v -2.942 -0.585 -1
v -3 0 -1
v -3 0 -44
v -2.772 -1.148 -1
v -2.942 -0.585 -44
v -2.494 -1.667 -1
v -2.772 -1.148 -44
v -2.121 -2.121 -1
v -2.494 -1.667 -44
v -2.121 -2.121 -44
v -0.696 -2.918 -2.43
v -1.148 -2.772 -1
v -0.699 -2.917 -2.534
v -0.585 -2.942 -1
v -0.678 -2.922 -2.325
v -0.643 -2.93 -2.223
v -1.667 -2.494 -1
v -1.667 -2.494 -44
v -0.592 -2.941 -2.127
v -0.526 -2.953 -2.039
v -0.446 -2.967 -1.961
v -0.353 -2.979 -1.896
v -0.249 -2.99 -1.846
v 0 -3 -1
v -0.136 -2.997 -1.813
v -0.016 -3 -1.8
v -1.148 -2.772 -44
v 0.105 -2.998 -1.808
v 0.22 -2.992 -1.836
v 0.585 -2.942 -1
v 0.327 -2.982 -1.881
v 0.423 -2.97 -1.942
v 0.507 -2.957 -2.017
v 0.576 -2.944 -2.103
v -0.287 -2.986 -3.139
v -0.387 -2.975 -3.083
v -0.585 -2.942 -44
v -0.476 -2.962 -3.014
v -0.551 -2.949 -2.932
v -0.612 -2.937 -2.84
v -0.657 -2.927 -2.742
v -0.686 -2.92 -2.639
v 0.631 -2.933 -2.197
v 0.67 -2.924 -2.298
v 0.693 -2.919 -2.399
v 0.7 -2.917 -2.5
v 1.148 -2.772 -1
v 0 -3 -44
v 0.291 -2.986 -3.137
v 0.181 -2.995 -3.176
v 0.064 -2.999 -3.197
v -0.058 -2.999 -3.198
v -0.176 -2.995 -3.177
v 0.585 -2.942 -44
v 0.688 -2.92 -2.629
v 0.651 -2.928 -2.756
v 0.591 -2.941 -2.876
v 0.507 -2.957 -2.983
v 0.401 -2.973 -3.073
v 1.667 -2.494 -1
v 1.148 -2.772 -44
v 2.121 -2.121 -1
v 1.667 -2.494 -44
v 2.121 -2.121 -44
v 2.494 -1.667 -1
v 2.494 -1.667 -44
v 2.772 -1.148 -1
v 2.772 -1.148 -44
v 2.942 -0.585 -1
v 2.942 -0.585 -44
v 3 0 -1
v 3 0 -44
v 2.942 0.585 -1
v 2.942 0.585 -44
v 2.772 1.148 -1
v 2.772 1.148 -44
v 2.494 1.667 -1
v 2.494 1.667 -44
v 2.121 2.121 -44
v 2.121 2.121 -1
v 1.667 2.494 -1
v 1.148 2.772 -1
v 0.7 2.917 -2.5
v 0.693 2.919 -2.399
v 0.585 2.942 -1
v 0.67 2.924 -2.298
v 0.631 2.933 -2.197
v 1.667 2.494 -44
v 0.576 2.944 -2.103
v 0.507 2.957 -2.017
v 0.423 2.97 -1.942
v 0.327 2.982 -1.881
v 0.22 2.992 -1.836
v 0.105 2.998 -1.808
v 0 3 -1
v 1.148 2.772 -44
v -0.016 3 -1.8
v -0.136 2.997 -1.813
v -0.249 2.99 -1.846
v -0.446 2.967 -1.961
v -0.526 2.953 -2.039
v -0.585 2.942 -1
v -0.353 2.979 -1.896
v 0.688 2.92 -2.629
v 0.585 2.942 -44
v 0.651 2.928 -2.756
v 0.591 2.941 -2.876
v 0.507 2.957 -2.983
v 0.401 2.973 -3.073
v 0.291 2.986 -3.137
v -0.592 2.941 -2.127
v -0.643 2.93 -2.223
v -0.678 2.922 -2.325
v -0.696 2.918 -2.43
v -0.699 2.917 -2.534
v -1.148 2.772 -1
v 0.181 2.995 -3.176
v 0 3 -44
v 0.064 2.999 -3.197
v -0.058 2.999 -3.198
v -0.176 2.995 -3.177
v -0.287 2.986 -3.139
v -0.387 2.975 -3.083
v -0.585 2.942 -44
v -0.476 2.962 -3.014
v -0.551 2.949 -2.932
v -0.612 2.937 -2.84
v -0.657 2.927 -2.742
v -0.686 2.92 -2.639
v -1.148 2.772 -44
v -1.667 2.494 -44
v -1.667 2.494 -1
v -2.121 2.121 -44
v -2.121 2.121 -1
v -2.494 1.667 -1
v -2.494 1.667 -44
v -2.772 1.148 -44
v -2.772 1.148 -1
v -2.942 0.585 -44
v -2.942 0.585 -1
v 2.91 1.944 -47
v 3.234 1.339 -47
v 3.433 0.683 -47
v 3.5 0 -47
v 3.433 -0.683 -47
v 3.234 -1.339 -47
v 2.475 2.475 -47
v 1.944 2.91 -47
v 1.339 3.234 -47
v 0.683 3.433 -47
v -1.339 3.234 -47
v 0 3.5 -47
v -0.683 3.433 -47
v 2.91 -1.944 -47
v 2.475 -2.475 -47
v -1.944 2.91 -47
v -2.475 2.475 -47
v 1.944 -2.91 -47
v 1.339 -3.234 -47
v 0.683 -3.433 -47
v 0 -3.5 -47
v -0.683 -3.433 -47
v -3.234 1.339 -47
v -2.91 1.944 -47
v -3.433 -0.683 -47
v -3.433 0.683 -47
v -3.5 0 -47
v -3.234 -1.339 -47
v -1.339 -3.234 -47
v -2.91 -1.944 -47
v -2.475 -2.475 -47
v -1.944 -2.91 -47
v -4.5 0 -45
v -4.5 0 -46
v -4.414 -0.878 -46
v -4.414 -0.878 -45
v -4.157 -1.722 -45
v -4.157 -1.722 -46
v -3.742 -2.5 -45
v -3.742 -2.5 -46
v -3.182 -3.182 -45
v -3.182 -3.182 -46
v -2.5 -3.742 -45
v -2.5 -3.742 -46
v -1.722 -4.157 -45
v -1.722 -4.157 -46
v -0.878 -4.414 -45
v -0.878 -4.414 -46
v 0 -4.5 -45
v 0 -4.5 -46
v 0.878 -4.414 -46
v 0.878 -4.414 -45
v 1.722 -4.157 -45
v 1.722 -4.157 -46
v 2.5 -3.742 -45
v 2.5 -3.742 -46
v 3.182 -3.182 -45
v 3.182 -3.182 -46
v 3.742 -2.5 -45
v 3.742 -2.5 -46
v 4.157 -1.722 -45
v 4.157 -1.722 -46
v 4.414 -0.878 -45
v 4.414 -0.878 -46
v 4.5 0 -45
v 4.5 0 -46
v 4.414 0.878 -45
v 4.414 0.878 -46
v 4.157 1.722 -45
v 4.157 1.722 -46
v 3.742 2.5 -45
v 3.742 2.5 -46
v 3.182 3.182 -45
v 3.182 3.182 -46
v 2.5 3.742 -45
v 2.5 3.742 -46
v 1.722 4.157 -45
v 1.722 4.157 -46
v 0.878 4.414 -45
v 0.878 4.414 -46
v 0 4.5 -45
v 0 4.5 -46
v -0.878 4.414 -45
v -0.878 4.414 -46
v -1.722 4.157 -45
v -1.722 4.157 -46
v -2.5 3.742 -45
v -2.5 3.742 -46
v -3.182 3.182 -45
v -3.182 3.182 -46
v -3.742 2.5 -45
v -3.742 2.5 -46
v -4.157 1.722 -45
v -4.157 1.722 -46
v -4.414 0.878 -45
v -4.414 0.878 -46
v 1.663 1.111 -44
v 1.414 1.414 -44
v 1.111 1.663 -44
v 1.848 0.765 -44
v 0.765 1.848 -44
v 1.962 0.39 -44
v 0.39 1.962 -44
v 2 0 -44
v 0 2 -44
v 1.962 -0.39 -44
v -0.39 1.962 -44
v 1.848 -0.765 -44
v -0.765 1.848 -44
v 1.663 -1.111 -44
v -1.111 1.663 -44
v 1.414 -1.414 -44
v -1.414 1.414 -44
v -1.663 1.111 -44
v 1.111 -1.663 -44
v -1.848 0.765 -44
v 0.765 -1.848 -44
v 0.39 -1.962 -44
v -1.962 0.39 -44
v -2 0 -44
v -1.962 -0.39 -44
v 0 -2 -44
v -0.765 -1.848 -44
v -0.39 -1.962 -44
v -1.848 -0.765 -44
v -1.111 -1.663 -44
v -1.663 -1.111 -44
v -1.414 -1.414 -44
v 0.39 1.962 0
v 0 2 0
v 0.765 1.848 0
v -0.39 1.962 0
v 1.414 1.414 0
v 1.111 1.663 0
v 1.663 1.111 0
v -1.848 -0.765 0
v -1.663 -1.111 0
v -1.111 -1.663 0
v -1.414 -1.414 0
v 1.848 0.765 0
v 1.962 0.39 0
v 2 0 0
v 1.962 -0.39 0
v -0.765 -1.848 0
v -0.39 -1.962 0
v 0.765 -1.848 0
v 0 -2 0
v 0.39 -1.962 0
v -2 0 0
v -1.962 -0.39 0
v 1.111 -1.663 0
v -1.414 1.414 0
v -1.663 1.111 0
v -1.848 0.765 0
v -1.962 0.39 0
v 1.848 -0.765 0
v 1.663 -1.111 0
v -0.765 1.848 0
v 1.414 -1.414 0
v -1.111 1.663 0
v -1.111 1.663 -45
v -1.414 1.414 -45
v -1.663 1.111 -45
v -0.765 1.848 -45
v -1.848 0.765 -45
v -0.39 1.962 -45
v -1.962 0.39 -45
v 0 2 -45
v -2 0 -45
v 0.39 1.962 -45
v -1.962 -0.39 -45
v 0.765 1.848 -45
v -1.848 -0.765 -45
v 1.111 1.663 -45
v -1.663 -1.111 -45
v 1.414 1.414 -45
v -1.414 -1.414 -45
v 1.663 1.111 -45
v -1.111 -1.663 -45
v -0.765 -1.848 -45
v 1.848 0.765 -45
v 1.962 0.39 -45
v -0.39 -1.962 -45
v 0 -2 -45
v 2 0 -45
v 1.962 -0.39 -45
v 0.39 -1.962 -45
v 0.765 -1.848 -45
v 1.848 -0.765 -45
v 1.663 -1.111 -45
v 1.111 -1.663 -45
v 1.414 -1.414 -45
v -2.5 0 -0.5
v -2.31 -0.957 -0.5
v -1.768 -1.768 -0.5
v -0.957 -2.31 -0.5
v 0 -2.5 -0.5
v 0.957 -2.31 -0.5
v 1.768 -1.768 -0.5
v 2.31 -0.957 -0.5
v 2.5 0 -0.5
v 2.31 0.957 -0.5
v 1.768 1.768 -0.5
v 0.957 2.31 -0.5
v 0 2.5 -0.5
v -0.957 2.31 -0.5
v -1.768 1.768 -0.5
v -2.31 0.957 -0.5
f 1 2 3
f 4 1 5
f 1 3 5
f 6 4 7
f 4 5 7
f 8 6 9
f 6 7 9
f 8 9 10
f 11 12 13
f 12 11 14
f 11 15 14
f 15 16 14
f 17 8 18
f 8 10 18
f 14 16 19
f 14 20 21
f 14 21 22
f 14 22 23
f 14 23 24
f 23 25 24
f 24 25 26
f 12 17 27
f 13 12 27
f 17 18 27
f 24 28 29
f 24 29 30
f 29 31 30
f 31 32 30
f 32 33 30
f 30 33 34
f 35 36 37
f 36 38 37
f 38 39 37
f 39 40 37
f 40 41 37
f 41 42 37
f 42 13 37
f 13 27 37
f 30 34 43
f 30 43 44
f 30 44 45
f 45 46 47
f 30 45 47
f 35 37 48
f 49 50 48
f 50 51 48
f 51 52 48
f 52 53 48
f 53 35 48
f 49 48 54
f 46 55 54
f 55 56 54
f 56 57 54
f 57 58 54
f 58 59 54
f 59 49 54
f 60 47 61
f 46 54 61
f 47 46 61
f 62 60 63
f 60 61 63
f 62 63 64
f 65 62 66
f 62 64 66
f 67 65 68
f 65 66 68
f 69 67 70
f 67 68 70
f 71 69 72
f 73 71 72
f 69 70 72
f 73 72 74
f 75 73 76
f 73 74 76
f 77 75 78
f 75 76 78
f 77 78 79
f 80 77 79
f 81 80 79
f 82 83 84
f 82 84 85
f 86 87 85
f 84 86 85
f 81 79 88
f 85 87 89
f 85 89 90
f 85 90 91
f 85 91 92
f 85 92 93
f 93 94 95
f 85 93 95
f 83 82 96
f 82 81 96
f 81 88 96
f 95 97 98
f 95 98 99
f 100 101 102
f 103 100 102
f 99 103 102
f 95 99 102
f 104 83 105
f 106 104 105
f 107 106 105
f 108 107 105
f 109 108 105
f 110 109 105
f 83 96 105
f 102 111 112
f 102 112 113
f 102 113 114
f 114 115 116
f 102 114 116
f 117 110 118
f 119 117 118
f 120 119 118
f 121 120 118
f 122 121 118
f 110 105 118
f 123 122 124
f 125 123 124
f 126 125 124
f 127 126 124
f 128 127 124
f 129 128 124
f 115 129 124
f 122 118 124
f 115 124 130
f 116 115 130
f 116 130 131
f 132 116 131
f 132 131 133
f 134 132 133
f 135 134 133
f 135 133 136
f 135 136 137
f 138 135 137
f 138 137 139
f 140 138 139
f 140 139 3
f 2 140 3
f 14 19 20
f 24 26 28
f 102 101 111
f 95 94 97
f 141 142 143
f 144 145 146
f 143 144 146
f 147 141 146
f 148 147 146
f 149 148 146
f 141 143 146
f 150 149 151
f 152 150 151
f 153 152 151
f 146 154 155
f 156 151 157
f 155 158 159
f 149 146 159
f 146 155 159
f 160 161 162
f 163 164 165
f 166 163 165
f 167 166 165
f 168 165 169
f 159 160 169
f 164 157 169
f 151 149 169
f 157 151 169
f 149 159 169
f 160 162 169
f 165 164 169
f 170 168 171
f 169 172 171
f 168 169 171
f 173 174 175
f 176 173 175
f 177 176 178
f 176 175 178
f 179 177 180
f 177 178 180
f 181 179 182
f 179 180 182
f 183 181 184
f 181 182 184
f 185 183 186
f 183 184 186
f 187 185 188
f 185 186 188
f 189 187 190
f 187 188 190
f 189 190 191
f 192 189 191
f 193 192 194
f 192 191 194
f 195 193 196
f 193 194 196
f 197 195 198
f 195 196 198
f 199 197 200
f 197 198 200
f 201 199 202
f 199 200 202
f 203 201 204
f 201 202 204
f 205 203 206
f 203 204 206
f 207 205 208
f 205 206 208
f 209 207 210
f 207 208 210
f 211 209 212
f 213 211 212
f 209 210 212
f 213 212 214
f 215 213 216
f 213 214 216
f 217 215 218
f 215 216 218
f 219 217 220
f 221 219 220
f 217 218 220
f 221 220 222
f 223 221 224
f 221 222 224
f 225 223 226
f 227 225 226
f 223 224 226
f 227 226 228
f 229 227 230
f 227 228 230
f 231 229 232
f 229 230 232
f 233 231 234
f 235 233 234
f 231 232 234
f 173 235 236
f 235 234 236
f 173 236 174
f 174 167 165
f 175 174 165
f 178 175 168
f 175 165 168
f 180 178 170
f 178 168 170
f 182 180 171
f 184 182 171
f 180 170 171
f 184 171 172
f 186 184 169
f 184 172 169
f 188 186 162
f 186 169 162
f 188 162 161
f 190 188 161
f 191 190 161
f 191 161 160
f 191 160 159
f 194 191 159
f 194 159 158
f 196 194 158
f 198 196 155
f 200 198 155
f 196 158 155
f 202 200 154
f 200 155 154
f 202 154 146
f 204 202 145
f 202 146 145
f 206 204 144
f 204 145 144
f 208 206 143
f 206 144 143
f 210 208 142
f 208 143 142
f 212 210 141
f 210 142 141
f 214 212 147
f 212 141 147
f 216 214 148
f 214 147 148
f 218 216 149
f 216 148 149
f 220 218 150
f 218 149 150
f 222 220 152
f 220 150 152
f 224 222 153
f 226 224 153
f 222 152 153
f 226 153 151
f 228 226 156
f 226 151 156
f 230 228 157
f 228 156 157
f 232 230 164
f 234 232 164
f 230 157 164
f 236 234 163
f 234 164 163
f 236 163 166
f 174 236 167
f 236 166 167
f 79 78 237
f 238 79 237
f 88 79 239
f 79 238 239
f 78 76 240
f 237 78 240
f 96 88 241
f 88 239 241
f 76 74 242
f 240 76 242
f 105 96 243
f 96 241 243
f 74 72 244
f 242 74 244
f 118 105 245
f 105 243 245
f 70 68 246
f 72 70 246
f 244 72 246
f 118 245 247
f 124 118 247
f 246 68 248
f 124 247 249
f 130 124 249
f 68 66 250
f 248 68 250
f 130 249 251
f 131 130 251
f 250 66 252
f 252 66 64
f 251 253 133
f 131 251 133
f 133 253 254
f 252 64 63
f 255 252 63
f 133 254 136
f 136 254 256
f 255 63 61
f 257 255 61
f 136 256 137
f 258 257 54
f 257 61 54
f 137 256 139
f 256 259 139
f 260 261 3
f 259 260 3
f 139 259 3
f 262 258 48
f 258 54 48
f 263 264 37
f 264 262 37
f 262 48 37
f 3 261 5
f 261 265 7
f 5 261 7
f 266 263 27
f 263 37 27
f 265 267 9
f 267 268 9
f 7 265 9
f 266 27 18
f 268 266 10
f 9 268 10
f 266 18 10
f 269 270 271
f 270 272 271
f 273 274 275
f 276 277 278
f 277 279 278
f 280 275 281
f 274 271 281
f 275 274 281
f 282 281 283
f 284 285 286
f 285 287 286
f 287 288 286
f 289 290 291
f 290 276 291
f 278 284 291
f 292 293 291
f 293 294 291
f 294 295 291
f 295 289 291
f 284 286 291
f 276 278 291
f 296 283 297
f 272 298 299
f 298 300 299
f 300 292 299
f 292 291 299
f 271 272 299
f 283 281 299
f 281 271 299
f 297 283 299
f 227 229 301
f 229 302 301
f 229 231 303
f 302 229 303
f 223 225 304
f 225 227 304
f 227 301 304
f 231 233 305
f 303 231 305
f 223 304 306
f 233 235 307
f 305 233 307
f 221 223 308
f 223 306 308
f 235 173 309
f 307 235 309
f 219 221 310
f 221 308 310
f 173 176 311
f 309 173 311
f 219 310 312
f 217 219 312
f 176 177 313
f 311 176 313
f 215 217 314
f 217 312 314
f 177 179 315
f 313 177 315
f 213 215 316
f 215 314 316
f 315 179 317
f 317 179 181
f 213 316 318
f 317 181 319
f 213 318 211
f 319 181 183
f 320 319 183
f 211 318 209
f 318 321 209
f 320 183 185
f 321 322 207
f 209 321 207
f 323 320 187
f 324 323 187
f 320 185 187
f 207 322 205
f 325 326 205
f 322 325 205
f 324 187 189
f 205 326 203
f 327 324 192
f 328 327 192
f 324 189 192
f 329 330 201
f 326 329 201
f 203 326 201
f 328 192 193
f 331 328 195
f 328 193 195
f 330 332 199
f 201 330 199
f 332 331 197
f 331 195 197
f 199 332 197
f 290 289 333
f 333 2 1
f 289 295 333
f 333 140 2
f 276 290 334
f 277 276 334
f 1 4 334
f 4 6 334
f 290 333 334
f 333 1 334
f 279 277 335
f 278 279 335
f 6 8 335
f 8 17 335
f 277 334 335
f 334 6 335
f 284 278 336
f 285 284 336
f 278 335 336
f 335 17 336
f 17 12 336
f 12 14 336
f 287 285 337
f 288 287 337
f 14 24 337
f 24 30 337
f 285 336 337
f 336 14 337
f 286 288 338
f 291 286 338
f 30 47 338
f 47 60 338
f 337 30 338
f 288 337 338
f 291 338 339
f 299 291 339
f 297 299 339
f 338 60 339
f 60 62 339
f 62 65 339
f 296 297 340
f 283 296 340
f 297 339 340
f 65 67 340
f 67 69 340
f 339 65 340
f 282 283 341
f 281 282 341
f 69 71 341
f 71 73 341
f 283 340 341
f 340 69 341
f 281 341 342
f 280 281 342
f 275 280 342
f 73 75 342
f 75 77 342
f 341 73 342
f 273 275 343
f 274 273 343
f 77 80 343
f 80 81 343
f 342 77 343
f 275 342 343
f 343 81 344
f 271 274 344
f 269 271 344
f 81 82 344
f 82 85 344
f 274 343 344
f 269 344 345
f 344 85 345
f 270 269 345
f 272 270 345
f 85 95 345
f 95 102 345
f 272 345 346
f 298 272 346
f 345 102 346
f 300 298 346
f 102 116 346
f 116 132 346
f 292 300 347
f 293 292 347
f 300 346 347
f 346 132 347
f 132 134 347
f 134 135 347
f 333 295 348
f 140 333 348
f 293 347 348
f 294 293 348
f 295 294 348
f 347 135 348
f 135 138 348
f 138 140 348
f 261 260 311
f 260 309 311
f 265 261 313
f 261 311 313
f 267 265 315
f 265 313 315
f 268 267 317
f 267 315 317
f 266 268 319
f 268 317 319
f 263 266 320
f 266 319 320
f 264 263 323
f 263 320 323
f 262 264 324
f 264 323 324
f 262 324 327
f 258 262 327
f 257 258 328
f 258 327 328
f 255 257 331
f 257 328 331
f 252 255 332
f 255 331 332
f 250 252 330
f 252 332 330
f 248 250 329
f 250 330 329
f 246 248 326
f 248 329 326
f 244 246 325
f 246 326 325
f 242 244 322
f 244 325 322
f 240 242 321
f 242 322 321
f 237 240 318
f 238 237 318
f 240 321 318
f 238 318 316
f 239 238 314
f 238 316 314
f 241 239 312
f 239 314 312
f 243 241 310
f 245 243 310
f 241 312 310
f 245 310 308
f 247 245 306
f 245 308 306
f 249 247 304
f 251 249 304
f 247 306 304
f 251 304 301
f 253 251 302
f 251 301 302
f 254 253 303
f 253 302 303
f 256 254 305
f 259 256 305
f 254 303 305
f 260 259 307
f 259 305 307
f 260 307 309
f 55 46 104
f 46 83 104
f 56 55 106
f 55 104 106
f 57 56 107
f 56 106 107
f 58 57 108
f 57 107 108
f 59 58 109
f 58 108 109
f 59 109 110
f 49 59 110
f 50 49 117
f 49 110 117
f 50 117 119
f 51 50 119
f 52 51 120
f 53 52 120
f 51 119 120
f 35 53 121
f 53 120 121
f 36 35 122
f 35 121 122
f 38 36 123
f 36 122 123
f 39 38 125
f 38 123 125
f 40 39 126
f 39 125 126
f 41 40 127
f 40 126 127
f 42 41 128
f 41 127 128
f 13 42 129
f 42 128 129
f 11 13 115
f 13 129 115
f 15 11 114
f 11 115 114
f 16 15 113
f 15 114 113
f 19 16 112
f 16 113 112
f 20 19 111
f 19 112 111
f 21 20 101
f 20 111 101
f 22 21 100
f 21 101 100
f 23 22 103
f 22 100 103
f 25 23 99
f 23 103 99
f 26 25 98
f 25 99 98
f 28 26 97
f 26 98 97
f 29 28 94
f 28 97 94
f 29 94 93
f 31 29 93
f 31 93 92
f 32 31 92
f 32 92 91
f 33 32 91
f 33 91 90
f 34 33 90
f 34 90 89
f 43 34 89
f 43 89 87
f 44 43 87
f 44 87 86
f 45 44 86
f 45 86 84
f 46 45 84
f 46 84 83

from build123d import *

# Parameters (mm, degrees)
SKETCH_2_R               = 0.7
CUT_EXTRUDE_1_DEPTH      = 5.5
CUT_EXTRUDE_1_DEPTH_BACK = 5.5
CHAMFER_1_SIZE           = 1


with BuildPart() as part:
    # 草图1 → 旋转1 (revolve)
    with BuildSketch(Plane(origin=(0, 0, 0), x_dir=(1, 0, 0), z_dir=(0, 1, 0))):
        Polygon((0, 0), (-3, 0), (-3, 44), (-2, 44), (-2, 45), (-4.5, 45), (-4.5, 47), (0, 47), align=None)
    revolve(axis=Axis((0, 0, -47), (0, 0, 1)))

    # 草图2 → 切除-拉伸1 (cut, two sides)
    with BuildSketch(Plane(origin=(0, 0, 0), x_dir=(1, 0, 0), z_dir=(0, 1, 0))) as cut_extrude_1_sk:
        with Locations((0, 2.5)):
            Circle(SKETCH_2_R)
    extrude(amount=CUT_EXTRUDE_1_DEPTH, mode=Mode.SUBTRACT)
    extrude(cut_extrude_1_sk.sketch, amount=-CUT_EXTRUDE_1_DEPTH_BACK, mode=Mode.SUBTRACT)

    # 倒角1
    chamfer_1_edges = [part.edges().sort_by_distance(p)[0] for p in [
        (4.5, 0, -47),
        (3, 0, 0),
    ]]
    chamfer(chamfer_1_edges, length=CHAMFER_1_SIZE)


solid = part.part
